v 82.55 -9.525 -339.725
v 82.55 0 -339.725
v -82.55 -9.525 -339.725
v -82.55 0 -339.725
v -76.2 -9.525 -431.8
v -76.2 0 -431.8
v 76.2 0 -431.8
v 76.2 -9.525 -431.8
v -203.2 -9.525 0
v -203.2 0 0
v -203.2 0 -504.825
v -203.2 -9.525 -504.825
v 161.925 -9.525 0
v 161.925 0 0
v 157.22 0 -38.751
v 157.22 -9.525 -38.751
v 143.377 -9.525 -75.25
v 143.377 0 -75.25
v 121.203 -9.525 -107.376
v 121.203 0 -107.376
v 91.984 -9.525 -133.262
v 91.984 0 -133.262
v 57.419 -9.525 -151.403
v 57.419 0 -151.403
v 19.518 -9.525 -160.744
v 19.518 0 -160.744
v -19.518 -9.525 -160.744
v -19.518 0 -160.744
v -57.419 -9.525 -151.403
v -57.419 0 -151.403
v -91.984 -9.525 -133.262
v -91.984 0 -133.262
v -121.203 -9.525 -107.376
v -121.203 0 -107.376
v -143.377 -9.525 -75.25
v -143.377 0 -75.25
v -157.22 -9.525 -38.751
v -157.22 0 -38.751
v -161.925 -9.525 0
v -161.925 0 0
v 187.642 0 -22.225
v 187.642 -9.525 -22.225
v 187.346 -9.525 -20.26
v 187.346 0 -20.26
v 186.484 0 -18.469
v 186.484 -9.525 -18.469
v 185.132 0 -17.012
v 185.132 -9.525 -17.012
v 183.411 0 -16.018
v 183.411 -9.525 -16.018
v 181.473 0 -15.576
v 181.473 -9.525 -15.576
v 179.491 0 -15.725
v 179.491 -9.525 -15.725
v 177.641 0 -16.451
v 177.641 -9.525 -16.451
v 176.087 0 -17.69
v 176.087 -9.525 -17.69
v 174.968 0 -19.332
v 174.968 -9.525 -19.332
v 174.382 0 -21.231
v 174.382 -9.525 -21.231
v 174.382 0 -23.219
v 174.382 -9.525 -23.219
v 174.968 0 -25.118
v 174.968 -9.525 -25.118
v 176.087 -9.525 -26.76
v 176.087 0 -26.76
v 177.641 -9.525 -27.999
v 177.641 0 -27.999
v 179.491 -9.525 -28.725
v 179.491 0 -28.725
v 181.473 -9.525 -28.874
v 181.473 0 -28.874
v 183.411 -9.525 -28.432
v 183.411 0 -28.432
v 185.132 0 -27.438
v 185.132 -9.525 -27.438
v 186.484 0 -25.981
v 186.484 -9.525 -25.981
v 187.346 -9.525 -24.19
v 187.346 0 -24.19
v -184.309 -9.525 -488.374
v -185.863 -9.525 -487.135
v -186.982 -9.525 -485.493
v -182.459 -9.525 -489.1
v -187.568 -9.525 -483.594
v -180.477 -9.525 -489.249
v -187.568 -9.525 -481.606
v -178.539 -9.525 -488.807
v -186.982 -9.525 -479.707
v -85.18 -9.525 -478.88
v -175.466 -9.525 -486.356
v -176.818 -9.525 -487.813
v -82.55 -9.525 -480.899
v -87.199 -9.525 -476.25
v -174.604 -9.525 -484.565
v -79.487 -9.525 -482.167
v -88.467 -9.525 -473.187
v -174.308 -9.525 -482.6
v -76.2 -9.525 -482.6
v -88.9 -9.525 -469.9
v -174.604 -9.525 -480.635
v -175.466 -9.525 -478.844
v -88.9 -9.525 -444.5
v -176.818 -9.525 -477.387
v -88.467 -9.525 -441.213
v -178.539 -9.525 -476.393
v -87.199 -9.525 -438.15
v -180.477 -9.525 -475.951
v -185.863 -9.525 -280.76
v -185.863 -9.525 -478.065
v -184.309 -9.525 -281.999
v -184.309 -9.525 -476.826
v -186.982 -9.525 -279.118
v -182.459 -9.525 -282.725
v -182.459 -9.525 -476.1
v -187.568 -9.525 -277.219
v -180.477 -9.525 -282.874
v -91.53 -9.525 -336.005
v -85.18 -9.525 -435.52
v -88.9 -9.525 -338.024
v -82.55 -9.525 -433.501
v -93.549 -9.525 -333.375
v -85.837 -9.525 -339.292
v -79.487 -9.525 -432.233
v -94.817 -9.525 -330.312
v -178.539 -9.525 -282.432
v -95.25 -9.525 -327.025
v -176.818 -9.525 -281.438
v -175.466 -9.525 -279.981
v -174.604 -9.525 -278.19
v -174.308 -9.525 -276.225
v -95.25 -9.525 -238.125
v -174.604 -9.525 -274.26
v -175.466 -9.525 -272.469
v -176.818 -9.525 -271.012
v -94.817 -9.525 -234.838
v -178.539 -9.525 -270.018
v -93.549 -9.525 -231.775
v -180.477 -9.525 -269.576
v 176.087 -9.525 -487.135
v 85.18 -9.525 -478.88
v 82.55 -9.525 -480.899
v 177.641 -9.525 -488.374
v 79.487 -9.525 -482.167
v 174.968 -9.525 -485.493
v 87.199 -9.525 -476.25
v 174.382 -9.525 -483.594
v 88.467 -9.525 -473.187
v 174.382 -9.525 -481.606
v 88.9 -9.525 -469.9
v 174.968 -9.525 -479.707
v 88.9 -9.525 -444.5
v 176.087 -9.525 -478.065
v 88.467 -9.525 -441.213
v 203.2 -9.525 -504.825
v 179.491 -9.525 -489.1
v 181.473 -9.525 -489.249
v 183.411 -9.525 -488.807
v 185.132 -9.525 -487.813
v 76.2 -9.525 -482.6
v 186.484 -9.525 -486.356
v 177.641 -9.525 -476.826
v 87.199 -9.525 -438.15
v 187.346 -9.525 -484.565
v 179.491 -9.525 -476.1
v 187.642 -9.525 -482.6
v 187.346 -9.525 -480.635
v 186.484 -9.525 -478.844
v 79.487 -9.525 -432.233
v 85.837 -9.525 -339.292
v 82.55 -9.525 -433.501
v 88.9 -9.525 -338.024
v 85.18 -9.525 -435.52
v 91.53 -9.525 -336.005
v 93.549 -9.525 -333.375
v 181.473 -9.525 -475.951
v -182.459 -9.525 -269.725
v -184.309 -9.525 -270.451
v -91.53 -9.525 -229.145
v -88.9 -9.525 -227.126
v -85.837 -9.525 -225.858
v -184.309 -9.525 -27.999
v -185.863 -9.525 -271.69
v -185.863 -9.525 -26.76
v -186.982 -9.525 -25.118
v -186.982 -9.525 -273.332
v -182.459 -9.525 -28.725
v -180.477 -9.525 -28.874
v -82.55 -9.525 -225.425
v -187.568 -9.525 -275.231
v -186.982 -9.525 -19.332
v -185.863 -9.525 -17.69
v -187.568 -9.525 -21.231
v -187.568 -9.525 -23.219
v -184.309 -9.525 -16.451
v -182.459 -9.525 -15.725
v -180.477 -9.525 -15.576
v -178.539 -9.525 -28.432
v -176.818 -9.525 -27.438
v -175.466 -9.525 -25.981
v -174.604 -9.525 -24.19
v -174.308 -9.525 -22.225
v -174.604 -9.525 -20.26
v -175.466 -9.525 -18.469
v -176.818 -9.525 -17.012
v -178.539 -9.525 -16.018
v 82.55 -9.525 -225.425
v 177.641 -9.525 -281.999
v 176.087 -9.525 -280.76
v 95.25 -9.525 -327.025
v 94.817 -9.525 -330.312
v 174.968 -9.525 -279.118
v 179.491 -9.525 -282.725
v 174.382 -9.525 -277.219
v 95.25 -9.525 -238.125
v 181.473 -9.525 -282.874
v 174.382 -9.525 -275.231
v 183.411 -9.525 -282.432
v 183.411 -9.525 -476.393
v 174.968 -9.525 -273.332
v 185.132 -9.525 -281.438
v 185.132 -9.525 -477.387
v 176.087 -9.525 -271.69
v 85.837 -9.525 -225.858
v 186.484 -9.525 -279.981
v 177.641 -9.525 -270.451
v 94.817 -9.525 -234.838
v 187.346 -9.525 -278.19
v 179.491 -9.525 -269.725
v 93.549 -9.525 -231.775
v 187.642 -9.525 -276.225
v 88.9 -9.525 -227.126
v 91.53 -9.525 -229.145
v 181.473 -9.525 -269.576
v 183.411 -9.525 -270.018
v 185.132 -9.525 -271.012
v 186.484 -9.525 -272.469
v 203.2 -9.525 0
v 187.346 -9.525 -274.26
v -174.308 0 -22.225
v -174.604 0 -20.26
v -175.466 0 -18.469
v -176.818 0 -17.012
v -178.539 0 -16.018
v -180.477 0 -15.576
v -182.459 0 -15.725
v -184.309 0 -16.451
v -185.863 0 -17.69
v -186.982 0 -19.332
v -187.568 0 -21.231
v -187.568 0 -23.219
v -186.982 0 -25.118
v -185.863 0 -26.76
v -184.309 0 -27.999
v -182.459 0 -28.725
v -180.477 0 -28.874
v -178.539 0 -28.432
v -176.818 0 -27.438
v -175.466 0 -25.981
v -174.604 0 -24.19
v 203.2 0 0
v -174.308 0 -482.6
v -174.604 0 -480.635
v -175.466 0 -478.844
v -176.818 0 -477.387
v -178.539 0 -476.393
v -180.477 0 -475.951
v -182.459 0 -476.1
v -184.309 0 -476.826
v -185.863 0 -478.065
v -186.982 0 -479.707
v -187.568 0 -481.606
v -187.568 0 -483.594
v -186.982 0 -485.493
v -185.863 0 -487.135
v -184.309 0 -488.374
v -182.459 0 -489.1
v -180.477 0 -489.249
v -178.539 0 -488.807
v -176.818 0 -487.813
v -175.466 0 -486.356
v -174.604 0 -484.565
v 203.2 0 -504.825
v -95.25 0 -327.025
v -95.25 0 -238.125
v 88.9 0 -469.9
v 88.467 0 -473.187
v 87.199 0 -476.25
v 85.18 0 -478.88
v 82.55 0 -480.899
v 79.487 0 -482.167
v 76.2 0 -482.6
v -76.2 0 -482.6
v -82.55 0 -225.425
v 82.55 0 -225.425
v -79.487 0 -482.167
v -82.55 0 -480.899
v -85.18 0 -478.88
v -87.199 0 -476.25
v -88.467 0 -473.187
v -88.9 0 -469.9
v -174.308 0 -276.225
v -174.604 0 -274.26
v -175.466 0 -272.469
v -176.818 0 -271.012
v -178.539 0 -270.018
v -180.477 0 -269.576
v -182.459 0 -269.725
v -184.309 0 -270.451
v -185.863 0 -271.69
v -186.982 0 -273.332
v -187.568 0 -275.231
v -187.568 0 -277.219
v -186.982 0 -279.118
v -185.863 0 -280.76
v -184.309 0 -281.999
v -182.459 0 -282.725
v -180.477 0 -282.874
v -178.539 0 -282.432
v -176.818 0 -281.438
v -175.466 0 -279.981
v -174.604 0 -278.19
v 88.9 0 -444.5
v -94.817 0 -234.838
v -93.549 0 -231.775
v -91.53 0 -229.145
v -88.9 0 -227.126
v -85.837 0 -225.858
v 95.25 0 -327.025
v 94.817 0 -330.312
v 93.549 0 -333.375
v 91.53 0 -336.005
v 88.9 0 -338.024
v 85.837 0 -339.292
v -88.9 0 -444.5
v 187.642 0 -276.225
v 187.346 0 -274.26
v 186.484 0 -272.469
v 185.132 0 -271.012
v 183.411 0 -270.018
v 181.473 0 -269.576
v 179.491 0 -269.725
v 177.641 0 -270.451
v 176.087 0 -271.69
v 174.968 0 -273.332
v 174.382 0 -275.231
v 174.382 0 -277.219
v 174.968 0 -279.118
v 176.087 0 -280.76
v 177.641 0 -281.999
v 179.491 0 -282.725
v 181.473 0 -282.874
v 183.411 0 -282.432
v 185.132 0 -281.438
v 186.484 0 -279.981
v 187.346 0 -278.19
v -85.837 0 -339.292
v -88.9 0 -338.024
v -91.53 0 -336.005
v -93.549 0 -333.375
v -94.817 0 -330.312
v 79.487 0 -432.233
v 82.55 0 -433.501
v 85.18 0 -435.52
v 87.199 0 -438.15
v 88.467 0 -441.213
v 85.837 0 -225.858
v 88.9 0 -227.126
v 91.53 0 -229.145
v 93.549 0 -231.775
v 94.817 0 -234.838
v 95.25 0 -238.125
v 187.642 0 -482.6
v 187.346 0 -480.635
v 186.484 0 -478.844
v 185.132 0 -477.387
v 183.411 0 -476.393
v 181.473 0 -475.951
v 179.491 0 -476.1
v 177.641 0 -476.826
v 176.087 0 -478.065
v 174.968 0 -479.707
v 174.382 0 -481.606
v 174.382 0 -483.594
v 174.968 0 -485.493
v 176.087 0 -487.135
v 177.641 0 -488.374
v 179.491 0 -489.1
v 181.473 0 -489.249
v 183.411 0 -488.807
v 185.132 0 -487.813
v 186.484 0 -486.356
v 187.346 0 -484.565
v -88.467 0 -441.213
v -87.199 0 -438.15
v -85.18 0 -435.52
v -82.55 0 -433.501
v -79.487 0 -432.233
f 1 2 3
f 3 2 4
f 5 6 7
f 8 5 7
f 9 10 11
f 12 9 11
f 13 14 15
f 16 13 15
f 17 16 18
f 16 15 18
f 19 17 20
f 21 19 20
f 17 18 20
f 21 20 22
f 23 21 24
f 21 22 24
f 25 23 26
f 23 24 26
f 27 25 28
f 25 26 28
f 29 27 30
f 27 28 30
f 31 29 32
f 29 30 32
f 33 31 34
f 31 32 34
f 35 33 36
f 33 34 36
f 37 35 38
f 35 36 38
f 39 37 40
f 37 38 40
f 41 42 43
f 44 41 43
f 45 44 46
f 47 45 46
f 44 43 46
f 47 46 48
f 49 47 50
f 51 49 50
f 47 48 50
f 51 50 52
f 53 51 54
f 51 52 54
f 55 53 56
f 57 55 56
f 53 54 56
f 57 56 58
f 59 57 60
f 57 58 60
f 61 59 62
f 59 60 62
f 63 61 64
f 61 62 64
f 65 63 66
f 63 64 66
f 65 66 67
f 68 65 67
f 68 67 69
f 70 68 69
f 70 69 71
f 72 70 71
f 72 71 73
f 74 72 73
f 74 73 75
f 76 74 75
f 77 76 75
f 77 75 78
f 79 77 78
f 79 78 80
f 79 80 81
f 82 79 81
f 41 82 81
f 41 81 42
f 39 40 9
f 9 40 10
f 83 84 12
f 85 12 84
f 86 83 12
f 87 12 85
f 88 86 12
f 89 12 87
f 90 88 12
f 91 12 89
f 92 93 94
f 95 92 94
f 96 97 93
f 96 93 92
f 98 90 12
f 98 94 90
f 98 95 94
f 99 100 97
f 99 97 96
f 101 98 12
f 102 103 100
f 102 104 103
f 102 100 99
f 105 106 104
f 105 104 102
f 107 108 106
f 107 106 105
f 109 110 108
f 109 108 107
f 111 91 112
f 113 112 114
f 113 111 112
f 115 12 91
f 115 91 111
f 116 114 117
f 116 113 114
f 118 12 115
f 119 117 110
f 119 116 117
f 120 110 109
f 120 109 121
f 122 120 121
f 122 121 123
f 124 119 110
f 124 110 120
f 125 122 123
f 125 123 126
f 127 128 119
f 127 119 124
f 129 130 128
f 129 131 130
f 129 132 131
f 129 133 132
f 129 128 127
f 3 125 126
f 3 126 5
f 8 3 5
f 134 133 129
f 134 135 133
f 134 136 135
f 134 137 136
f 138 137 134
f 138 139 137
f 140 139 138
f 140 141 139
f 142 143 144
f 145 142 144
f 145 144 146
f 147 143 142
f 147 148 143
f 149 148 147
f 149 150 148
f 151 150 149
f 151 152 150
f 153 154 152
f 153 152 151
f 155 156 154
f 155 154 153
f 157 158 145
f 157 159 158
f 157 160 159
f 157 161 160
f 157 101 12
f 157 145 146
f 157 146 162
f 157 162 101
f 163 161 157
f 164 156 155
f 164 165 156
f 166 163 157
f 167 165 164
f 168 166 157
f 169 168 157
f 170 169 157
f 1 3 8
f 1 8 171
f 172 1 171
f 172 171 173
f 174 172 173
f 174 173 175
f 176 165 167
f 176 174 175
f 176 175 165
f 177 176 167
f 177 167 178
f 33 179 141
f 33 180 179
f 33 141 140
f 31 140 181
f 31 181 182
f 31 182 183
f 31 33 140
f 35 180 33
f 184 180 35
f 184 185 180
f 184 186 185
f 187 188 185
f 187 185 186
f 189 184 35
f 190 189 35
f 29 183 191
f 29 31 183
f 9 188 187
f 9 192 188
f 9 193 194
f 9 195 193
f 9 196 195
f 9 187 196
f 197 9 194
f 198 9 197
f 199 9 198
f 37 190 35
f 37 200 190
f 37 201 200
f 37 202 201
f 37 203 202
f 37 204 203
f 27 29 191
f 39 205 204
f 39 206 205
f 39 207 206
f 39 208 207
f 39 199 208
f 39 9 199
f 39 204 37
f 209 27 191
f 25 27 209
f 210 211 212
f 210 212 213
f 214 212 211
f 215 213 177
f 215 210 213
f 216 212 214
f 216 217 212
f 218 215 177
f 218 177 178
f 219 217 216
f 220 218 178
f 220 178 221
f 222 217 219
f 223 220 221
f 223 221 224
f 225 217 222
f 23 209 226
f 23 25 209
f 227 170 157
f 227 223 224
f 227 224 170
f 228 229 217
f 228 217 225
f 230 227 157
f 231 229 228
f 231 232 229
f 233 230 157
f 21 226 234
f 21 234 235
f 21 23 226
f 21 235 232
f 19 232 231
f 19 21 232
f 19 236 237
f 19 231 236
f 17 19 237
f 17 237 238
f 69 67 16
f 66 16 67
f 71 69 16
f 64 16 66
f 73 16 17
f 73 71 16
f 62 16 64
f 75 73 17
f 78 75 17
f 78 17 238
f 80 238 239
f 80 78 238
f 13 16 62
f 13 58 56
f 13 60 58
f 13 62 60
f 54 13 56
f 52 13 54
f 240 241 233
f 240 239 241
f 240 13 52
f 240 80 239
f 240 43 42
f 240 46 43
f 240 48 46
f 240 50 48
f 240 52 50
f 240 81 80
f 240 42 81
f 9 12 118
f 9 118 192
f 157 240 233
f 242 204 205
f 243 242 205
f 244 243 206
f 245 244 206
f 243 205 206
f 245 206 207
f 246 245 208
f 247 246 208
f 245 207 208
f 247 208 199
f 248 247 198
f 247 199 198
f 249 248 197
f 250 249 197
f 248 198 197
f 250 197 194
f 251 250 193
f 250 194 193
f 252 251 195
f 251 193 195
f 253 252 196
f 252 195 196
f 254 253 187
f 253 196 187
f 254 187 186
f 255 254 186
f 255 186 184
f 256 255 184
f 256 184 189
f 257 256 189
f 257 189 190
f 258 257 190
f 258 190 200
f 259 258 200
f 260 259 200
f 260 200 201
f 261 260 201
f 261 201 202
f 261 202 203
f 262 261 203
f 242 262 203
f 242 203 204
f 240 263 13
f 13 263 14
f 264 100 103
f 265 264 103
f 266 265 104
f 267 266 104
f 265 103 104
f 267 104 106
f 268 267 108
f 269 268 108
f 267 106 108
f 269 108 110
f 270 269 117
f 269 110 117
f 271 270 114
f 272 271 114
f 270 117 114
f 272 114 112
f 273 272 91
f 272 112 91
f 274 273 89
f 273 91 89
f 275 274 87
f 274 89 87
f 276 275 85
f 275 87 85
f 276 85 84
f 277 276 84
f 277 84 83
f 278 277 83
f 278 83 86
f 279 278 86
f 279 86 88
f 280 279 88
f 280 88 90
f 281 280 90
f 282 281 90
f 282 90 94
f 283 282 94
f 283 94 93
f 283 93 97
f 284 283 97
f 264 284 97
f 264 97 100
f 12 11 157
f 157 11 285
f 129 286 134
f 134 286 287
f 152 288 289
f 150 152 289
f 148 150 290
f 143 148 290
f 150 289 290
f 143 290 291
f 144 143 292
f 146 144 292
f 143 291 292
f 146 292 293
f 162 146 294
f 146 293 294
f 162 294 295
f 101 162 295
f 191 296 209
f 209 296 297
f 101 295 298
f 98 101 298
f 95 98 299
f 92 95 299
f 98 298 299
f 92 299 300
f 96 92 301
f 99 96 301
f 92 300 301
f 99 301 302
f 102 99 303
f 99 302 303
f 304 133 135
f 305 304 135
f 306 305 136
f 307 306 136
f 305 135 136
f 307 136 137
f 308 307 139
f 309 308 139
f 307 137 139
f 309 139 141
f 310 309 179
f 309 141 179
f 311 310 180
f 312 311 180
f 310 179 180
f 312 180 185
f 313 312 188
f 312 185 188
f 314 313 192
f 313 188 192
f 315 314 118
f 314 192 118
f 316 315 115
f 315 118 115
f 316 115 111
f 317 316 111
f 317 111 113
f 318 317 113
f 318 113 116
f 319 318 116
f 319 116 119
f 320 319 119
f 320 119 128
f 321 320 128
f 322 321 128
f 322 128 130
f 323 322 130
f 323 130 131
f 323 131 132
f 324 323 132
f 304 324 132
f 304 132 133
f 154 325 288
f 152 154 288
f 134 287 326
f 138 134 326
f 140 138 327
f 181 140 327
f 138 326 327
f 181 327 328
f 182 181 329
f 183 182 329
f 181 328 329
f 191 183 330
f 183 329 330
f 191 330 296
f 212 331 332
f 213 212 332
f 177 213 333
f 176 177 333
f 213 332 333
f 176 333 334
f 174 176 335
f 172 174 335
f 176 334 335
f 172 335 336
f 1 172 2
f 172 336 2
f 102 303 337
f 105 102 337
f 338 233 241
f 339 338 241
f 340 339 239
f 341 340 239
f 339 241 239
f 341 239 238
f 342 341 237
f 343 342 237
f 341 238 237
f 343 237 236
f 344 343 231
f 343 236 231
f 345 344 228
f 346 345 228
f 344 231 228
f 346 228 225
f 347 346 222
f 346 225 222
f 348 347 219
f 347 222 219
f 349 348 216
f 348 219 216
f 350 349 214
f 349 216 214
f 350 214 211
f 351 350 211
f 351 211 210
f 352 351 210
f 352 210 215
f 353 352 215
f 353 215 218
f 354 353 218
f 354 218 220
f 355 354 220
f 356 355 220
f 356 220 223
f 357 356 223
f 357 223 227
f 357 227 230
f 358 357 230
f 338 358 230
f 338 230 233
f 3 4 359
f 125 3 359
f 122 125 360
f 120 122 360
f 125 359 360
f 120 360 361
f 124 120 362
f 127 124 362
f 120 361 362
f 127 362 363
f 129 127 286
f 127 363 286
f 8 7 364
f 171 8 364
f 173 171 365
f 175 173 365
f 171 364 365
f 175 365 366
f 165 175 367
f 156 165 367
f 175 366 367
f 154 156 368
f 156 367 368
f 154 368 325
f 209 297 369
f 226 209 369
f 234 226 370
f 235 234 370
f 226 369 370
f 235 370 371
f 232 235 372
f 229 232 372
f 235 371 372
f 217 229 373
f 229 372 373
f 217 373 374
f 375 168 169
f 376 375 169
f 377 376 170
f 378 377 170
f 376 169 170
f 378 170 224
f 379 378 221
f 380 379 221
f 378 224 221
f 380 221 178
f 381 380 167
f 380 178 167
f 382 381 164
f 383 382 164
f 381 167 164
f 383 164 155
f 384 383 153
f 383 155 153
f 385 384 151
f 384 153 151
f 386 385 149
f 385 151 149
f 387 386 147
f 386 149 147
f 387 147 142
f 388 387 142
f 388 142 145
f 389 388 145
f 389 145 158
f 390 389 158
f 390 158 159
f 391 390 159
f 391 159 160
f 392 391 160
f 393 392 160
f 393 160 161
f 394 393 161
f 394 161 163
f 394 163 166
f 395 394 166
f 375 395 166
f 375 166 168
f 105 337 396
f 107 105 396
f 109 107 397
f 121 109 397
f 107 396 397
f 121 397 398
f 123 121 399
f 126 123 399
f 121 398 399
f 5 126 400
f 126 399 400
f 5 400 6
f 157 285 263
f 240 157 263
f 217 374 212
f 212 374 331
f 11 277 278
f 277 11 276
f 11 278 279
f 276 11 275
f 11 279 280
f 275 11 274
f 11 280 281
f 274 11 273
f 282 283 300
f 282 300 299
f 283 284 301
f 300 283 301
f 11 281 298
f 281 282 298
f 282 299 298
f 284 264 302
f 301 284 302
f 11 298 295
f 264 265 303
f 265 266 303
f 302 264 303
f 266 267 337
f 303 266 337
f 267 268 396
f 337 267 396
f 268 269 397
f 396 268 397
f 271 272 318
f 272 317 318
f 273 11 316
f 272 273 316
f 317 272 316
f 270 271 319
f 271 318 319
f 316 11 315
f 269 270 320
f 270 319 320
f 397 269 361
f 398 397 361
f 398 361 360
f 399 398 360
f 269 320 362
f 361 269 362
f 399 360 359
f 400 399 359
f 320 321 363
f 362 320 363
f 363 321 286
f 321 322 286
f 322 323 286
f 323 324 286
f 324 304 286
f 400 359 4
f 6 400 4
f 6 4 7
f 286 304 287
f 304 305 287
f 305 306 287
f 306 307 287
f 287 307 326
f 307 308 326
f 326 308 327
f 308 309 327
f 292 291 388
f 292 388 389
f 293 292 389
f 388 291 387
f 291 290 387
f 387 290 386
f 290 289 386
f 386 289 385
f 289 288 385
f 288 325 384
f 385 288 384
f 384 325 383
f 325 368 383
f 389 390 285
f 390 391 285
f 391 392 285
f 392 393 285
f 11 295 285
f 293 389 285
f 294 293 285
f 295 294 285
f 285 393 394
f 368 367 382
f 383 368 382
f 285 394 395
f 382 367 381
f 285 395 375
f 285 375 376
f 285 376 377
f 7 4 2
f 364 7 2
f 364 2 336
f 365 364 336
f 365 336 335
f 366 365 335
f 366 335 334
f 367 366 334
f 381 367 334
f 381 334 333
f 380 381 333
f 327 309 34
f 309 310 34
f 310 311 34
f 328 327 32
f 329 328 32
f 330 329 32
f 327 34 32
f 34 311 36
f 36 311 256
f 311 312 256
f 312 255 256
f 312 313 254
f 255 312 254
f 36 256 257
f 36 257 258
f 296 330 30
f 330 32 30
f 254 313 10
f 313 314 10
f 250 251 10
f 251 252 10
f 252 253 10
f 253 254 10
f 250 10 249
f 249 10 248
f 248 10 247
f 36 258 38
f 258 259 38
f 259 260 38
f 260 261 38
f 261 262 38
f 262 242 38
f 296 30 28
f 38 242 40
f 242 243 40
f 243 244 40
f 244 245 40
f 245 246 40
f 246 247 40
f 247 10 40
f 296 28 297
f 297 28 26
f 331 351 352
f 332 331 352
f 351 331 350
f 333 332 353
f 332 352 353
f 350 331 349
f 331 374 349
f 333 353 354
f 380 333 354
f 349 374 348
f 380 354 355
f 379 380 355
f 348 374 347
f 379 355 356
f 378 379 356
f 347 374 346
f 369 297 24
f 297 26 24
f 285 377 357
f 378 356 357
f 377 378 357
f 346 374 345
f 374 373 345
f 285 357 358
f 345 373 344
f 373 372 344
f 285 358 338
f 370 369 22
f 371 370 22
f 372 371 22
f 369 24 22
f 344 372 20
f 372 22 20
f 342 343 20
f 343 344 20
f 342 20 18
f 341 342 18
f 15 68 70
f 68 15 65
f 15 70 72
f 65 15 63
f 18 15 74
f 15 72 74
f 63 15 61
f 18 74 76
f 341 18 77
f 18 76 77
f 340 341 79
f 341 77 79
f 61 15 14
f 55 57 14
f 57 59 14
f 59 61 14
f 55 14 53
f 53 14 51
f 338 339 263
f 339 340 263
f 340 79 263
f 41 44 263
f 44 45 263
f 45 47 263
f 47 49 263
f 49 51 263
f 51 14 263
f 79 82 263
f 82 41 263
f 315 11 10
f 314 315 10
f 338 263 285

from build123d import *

# Parameters (mm, degrees)
F1_DEPTH = 9.525
F2_R     = 6.6675
F3_DEPTH = 9.526


with BuildPart() as f1:
    # F0 (on Front) → F1 (new body)
    with BuildSketch(Plane.XZ):
        with BuildLine():
            ThreePointArc((161.925, 0), (0, -161.925), (-161.925, 0))
            Line((-161.925, 0), (-203.2, 0))
            Line((-203.2, 0), (-203.2, -504.825))
            Line((-203.2, -504.825), (203.2, -504.825))
            Line((203.2, -504.825), (203.2, 0))
            Line((203.2, 0), (161.925, 0))
        make_face()
        with BuildLine():
            Line((-88.9, -469.9), (-88.9, -444.5))
            ThreePointArc((-88.9, -444.5), (-85.180256, -435.519744), (-76.2, -431.8))
            Line((-76.2, -431.8), (76.2, -431.8))
            ThreePointArc((76.2, -431.8), (85.180256, -435.519744), (88.9, -444.5))
            Line((88.9, -444.5), (88.9, -469.9))
            ThreePointArc((88.9, -469.9), (85.180256, -478.880256), (76.2, -482.6))
            Line((76.2, -482.6), (-76.2, -482.6))
            ThreePointArc((-76.2, -482.6), (-85.180256, -478.880256), (-88.9, -469.9))
        make_face(mode=Mode.SUBTRACT)
        with BuildLine():
            Line((-95.25, -327.025), (-95.25, -238.125))
            ThreePointArc((-95.25, -238.125), (-91.530256, -229.144744), (-82.55, -225.425))
            Line((-82.55, -225.425), (82.55, -225.425))
            ThreePointArc((82.55, -225.425), (91.530256, -229.144744), (95.25, -238.125))
            Line((95.25, -238.125), (95.25, -327.025))
            ThreePointArc((95.25, -327.025), (91.530256, -336.005256), (82.55, -339.725))
            Line((82.55, -339.725), (-82.55, -339.725))
            ThreePointArc((-82.55, -339.725), (-91.530256, -336.005256), (-95.25, -327.025))
        make_face(mode=Mode.SUBTRACT)
    extrude(amount=F1_DEPTH)

    # F2 (on face) → F3 (cut, through all)
    with BuildSketch(Plane.XZ.offset(9.525)):
        with Locations((-180.975, -482.6)):
            Circle(F2_R)
        with Locations((180.975, -482.6)):
            Circle(F2_R)
        with Locations((-180.975, -22.225)):
            Circle(F2_R)
        with Locations((180.975, -22.225)):
            Circle(F2_R)
        with Locations((180.975, -276.225)):
            Circle(F2_R)
        with Locations((-180.975, -276.225)):
            Circle(F2_R)
    extrude(amount=-F3_DEPTH, mode=Mode.SUBTRACT)


solid = f1.part
